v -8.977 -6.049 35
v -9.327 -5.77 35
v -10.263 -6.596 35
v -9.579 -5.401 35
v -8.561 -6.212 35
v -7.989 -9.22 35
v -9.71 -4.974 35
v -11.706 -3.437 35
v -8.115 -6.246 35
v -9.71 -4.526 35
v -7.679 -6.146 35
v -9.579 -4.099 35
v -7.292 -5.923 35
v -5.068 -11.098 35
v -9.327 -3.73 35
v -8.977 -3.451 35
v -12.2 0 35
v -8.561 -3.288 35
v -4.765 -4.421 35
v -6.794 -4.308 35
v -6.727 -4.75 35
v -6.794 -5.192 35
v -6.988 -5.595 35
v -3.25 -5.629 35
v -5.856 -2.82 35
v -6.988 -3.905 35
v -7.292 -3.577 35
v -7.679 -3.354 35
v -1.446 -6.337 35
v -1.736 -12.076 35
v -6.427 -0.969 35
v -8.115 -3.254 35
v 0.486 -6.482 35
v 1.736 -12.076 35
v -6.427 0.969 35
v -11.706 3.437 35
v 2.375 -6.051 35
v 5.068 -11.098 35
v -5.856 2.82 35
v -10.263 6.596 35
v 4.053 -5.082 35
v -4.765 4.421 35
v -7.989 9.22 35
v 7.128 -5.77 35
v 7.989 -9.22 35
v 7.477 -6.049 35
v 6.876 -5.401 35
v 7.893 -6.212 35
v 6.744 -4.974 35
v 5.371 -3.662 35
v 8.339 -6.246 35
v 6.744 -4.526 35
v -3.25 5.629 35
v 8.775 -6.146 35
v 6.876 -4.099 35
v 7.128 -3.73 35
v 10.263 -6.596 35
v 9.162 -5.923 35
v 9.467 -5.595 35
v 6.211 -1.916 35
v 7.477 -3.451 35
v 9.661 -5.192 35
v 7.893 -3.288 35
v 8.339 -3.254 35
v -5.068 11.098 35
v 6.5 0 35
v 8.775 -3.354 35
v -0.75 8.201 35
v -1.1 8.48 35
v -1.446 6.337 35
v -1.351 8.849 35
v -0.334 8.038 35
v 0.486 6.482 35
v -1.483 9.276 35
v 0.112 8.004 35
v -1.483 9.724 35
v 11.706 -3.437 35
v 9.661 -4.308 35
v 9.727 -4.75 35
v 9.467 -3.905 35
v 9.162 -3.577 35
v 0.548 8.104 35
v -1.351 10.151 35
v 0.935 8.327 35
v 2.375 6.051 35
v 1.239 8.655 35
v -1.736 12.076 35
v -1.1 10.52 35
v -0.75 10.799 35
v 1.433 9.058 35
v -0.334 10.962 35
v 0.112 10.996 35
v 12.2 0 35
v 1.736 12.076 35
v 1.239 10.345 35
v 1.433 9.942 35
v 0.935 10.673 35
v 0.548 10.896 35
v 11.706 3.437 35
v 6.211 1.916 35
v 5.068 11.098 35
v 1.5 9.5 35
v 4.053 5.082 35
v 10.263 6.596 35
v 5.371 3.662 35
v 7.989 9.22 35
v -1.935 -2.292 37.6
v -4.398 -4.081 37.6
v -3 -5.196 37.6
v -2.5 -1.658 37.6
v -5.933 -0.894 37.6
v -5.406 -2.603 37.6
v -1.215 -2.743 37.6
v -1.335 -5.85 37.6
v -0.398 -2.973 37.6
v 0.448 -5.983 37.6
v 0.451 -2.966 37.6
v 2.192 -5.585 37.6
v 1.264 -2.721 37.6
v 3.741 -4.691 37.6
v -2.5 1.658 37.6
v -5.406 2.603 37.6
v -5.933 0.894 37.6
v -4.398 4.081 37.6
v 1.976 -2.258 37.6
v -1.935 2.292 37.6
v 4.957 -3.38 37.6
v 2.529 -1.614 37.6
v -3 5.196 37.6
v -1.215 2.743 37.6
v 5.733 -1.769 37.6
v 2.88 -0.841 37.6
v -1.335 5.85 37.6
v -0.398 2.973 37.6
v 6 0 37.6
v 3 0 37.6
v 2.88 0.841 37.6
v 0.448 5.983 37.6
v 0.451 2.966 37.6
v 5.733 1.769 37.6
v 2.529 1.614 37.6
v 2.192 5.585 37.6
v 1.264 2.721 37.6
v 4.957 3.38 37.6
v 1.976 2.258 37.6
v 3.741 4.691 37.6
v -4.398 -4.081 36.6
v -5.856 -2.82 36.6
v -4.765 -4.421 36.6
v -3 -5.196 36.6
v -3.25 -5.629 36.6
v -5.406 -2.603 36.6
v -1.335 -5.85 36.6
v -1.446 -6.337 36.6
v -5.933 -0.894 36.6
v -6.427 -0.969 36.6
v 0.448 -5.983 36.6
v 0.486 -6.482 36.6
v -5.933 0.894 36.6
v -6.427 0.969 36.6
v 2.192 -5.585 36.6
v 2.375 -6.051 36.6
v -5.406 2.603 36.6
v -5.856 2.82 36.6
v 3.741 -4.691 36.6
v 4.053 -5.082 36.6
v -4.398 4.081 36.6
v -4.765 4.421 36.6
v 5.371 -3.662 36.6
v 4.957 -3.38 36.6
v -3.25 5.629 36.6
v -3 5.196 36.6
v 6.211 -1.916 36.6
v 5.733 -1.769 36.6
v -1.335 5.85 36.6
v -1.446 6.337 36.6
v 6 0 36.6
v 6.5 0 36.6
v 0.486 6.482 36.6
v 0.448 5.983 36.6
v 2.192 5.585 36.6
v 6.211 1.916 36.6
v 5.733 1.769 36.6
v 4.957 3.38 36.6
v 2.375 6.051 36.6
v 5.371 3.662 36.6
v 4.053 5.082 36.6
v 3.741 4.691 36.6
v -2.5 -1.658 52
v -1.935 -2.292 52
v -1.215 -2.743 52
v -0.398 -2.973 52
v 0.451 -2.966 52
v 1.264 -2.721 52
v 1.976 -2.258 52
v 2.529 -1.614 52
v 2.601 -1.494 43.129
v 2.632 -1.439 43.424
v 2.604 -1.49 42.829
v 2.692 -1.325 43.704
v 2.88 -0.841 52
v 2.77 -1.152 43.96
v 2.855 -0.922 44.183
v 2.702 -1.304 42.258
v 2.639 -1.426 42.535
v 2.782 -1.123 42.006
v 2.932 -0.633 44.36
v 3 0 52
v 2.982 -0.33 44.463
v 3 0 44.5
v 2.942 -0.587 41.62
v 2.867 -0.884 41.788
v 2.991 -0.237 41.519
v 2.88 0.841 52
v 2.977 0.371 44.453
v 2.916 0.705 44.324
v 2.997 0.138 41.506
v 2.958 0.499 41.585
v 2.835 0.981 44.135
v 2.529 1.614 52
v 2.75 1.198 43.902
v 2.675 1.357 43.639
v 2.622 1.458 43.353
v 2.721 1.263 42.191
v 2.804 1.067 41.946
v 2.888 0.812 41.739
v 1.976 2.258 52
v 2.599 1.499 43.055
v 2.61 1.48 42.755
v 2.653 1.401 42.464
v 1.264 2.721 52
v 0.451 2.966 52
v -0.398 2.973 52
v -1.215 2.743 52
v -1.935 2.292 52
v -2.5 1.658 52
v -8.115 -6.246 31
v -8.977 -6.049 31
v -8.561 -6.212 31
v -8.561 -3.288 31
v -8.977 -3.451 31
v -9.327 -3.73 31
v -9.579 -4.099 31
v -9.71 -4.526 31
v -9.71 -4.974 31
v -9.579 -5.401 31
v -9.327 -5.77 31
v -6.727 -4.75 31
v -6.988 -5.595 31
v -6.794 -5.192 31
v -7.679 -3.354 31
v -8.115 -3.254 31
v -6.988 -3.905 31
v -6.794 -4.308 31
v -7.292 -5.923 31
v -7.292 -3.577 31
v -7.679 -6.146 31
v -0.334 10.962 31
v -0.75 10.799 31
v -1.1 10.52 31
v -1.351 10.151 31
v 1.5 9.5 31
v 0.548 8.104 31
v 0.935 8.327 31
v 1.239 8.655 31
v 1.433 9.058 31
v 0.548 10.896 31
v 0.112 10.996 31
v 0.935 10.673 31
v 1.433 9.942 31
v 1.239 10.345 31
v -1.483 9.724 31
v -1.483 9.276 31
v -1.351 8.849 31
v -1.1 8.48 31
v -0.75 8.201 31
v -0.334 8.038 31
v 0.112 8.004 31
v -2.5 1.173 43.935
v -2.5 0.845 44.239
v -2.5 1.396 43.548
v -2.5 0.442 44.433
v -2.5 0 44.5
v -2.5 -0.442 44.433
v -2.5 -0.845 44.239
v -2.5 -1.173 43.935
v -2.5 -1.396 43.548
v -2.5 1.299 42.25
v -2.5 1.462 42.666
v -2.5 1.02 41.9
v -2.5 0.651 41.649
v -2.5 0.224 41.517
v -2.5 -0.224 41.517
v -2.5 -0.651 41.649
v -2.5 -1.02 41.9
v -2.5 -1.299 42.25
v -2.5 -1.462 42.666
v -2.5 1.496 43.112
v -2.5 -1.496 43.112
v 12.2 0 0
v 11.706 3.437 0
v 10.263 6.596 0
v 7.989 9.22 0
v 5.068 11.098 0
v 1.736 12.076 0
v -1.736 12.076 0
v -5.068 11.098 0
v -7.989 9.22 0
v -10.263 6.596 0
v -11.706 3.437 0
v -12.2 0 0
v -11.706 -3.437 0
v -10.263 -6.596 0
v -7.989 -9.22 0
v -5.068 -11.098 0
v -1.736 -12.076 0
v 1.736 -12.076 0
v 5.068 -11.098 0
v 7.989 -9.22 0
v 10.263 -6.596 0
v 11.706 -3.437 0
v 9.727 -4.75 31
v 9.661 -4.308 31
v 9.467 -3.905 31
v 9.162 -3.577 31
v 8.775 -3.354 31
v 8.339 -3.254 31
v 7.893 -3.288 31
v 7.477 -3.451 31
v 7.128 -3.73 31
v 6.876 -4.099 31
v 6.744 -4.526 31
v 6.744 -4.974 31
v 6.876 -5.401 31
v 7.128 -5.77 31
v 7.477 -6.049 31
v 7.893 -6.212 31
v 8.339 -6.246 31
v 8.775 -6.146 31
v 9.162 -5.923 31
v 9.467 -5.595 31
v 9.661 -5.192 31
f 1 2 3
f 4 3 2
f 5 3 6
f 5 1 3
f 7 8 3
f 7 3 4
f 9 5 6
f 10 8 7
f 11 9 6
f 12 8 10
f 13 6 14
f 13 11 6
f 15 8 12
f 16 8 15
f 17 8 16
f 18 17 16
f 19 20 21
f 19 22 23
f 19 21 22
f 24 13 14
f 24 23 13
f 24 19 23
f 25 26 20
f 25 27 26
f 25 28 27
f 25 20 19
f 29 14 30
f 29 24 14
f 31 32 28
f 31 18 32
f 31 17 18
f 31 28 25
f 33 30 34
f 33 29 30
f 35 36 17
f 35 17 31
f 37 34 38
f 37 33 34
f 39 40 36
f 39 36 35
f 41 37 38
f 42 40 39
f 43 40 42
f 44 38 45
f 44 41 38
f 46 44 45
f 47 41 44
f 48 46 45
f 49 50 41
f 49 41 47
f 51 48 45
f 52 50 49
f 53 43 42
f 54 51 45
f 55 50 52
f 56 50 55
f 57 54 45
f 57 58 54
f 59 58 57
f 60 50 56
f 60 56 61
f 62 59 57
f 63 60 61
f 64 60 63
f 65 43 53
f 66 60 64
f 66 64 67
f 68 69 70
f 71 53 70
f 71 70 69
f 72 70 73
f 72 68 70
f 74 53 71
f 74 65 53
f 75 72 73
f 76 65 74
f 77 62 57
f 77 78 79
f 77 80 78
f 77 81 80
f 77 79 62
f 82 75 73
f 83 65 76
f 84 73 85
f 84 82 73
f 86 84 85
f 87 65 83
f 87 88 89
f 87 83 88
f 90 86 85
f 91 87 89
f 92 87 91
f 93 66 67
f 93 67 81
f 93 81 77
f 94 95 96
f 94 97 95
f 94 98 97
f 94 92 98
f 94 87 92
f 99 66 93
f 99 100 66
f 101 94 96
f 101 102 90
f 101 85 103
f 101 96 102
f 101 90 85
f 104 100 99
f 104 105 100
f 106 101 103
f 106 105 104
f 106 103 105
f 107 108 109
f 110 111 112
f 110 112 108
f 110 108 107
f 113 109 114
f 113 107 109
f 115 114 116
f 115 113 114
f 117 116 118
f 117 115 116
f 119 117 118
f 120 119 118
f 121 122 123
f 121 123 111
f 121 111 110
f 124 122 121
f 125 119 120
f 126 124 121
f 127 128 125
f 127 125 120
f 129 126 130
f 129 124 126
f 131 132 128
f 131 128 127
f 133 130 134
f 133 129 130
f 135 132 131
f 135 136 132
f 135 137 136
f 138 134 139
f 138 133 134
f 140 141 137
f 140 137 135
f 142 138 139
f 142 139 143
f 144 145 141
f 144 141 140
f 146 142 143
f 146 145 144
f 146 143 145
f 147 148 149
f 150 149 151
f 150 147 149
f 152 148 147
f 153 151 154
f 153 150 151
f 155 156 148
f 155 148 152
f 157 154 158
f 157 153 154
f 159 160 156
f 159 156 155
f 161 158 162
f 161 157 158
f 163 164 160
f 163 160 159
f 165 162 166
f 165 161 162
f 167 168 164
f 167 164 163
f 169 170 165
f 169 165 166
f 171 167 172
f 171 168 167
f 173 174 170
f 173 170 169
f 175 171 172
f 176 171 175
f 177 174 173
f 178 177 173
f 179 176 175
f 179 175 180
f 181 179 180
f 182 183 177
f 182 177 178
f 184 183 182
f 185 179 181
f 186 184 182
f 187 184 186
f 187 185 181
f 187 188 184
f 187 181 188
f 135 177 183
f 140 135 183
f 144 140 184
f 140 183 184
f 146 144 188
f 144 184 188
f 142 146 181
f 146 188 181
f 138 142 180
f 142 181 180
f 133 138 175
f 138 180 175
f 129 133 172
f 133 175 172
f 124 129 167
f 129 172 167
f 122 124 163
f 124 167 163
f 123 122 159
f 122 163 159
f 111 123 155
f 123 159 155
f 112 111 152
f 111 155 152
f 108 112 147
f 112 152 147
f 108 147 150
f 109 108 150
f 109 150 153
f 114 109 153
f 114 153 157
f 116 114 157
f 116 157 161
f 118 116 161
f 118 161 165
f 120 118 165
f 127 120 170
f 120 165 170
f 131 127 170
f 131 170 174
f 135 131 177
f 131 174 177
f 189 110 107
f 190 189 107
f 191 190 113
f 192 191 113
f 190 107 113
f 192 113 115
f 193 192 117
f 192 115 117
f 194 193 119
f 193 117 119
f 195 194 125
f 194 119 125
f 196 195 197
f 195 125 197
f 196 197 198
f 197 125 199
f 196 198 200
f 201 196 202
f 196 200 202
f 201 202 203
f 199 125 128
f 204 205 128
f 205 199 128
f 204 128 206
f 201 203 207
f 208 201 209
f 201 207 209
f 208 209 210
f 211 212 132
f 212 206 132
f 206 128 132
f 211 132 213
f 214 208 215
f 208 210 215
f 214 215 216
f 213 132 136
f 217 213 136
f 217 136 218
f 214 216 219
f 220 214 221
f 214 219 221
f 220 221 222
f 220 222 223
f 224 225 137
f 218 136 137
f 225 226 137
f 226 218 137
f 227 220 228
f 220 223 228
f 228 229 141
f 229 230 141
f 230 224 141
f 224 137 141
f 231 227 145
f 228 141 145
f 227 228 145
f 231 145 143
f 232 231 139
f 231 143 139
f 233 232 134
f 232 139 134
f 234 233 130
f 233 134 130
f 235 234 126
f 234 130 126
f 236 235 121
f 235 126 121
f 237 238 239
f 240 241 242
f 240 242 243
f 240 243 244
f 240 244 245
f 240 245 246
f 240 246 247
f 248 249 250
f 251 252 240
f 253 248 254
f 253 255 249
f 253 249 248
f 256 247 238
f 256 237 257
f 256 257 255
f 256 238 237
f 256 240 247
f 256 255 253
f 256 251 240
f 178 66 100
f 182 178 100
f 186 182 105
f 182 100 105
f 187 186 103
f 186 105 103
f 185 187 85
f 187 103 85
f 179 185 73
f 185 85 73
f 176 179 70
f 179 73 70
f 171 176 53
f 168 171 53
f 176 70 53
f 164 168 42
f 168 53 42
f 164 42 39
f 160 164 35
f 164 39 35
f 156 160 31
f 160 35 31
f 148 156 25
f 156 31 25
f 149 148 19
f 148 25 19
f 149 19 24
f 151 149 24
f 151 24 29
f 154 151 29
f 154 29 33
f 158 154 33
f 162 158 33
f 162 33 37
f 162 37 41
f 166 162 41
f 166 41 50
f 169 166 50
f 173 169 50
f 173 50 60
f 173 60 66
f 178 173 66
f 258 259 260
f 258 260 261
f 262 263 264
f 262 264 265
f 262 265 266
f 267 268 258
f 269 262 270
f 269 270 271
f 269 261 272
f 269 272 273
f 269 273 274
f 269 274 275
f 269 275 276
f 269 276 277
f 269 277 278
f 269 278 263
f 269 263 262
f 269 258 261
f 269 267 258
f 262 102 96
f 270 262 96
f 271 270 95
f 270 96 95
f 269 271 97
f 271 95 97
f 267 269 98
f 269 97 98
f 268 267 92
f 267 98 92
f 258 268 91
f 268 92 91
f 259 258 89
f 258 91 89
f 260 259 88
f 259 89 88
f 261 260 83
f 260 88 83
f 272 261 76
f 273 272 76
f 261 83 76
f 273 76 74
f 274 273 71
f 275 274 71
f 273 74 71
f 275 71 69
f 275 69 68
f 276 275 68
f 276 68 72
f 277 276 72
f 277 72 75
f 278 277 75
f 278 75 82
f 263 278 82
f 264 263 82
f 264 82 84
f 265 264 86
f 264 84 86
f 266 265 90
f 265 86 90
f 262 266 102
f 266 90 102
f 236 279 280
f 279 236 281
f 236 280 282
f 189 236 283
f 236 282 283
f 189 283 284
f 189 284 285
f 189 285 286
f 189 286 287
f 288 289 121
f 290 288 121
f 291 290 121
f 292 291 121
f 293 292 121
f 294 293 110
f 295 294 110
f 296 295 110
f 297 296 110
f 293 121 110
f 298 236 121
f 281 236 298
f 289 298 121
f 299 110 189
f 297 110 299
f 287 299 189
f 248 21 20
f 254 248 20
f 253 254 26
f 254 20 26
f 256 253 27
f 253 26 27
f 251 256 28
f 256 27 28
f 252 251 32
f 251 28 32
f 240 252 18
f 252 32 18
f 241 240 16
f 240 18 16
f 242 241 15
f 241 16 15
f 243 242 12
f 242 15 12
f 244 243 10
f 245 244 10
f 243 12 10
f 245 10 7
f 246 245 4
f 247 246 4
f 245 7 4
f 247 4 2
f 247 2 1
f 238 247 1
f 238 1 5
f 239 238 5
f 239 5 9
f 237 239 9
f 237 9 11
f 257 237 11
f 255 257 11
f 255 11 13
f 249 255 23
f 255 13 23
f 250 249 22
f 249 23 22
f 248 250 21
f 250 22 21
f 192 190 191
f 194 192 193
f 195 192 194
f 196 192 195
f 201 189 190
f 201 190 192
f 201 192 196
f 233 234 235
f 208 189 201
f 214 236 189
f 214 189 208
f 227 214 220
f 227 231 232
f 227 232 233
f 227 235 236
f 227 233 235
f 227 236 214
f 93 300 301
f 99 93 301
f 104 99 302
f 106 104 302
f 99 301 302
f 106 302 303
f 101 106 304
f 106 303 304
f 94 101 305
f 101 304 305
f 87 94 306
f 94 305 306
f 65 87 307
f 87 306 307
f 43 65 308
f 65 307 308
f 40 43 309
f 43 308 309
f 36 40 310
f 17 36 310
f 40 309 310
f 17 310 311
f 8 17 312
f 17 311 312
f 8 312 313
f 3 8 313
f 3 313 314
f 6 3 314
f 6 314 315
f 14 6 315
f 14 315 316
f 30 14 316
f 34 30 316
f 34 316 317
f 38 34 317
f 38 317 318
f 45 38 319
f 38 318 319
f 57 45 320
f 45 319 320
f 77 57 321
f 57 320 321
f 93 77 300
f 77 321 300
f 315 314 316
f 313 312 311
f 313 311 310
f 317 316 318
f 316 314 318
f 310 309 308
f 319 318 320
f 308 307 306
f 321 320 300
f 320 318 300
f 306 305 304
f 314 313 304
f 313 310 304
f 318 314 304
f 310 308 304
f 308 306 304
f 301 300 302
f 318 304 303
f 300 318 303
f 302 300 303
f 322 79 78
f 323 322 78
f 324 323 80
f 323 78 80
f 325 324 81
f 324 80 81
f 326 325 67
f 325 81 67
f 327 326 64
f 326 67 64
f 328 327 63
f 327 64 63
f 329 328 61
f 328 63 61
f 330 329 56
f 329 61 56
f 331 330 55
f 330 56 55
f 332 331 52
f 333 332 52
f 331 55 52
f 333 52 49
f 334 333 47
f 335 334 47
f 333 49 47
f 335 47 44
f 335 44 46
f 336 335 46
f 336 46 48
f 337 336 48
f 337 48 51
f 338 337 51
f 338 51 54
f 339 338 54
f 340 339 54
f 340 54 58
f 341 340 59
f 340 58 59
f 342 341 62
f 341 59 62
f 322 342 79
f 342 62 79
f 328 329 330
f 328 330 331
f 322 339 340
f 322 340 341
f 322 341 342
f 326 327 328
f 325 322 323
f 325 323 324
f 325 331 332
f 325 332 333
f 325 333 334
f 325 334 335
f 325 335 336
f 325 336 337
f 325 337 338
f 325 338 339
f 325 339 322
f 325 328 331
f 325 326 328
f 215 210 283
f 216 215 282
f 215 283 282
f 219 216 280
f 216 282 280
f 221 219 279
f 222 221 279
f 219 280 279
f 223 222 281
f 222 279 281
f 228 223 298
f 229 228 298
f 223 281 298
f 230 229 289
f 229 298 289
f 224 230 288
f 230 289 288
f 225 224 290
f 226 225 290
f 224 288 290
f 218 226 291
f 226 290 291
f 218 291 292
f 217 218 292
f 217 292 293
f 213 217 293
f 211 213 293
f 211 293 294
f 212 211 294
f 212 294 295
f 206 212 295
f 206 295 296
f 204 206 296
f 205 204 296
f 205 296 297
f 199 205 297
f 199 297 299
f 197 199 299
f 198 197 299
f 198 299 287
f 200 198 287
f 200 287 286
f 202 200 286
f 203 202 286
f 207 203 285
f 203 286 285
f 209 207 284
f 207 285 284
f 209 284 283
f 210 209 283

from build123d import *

# Parameters (mm, degrees)
SKETCH_1_R          = 12.2
EXTRUDE_1_DEPTH     = 35
SKETCH_2_R          = 6.5
EXTRUDE_2_DEPTH     = 2.6
EXTRUDE_3_DEPTH     = 14.4
CUT_EXTRUDE_START   = -1
SKETCH_4_R          = 6.5
SKETCH_4_R_2        = 6
CUT_EXTRUDE_2_DEPTH = 1
SKETCH_5_R          = 1.5
CUT_EXTRUDE_3_DEPTH = 56.397924149
SKETCH_6_R          = 1.5
CUT_EXTRUDE_5_DEPTH = 4


with BuildPart() as part:
    # 草图1 → 凸台-拉伸1 (new body)
    with BuildSketch(Plane.XY):
        Circle(SKETCH_1_R)
    extrude(amount=EXTRUDE_1_DEPTH)

    # 草图2 → 凸台-拉伸2 (add)
    with BuildSketch(Plane.XY.offset(35)):
        Circle(SKETCH_2_R)
    extrude(amount=EXTRUDE_2_DEPTH)

    # 草图3 → 凸台-拉伸3 (add)
    with BuildSketch(Plane.XY.offset(37.6)):
        with BuildLine():
            Line((-2.5, 1.658312395), (-2.5, -1.658312395))
            ThreePointArc((-2.5, -1.658312395), (3, 0), (-2.5, 1.658312395))
        make_face()
    extrude(amount=EXTRUDE_3_DEPTH)

    # 草图4 → 切除-拉伸2 (cut)
    with BuildSketch(Plane.XY.offset(37.6).offset(CUT_EXTRUDE_START)):
        Circle(SKETCH_4_R)
        Circle(SKETCH_4_R_2, mode=Mode.SUBTRACT)
    extrude(amount=CUT_EXTRUDE_2_DEPTH, mode=Mode.SUBTRACT)

    # 草图5 → 切除-拉伸3 (cut, through all)
    with BuildSketch(Plane.ZY.offset(2.5)):
        with Locations((43, 0)):
            Circle(SKETCH_5_R)
    extrude(amount=-CUT_EXTRUDE_3_DEPTH, mode=Mode.SUBTRACT)

    # 草图6 → 切除-拉伸5 (cut)
    with BuildSketch(Plane.XY.offset(35)):
        with Locations((0, 9.5)):
            Circle(SKETCH_6_R)
        with Locations((8.227241336, -4.75)):
            Circle(SKETCH_6_R)
        with Locations((-8.227241336, -4.75)):
            Circle(SKETCH_6_R)
    extrude(amount=-CUT_EXTRUDE_5_DEPTH, mode=Mode.SUBTRACT)


solid = part.part
